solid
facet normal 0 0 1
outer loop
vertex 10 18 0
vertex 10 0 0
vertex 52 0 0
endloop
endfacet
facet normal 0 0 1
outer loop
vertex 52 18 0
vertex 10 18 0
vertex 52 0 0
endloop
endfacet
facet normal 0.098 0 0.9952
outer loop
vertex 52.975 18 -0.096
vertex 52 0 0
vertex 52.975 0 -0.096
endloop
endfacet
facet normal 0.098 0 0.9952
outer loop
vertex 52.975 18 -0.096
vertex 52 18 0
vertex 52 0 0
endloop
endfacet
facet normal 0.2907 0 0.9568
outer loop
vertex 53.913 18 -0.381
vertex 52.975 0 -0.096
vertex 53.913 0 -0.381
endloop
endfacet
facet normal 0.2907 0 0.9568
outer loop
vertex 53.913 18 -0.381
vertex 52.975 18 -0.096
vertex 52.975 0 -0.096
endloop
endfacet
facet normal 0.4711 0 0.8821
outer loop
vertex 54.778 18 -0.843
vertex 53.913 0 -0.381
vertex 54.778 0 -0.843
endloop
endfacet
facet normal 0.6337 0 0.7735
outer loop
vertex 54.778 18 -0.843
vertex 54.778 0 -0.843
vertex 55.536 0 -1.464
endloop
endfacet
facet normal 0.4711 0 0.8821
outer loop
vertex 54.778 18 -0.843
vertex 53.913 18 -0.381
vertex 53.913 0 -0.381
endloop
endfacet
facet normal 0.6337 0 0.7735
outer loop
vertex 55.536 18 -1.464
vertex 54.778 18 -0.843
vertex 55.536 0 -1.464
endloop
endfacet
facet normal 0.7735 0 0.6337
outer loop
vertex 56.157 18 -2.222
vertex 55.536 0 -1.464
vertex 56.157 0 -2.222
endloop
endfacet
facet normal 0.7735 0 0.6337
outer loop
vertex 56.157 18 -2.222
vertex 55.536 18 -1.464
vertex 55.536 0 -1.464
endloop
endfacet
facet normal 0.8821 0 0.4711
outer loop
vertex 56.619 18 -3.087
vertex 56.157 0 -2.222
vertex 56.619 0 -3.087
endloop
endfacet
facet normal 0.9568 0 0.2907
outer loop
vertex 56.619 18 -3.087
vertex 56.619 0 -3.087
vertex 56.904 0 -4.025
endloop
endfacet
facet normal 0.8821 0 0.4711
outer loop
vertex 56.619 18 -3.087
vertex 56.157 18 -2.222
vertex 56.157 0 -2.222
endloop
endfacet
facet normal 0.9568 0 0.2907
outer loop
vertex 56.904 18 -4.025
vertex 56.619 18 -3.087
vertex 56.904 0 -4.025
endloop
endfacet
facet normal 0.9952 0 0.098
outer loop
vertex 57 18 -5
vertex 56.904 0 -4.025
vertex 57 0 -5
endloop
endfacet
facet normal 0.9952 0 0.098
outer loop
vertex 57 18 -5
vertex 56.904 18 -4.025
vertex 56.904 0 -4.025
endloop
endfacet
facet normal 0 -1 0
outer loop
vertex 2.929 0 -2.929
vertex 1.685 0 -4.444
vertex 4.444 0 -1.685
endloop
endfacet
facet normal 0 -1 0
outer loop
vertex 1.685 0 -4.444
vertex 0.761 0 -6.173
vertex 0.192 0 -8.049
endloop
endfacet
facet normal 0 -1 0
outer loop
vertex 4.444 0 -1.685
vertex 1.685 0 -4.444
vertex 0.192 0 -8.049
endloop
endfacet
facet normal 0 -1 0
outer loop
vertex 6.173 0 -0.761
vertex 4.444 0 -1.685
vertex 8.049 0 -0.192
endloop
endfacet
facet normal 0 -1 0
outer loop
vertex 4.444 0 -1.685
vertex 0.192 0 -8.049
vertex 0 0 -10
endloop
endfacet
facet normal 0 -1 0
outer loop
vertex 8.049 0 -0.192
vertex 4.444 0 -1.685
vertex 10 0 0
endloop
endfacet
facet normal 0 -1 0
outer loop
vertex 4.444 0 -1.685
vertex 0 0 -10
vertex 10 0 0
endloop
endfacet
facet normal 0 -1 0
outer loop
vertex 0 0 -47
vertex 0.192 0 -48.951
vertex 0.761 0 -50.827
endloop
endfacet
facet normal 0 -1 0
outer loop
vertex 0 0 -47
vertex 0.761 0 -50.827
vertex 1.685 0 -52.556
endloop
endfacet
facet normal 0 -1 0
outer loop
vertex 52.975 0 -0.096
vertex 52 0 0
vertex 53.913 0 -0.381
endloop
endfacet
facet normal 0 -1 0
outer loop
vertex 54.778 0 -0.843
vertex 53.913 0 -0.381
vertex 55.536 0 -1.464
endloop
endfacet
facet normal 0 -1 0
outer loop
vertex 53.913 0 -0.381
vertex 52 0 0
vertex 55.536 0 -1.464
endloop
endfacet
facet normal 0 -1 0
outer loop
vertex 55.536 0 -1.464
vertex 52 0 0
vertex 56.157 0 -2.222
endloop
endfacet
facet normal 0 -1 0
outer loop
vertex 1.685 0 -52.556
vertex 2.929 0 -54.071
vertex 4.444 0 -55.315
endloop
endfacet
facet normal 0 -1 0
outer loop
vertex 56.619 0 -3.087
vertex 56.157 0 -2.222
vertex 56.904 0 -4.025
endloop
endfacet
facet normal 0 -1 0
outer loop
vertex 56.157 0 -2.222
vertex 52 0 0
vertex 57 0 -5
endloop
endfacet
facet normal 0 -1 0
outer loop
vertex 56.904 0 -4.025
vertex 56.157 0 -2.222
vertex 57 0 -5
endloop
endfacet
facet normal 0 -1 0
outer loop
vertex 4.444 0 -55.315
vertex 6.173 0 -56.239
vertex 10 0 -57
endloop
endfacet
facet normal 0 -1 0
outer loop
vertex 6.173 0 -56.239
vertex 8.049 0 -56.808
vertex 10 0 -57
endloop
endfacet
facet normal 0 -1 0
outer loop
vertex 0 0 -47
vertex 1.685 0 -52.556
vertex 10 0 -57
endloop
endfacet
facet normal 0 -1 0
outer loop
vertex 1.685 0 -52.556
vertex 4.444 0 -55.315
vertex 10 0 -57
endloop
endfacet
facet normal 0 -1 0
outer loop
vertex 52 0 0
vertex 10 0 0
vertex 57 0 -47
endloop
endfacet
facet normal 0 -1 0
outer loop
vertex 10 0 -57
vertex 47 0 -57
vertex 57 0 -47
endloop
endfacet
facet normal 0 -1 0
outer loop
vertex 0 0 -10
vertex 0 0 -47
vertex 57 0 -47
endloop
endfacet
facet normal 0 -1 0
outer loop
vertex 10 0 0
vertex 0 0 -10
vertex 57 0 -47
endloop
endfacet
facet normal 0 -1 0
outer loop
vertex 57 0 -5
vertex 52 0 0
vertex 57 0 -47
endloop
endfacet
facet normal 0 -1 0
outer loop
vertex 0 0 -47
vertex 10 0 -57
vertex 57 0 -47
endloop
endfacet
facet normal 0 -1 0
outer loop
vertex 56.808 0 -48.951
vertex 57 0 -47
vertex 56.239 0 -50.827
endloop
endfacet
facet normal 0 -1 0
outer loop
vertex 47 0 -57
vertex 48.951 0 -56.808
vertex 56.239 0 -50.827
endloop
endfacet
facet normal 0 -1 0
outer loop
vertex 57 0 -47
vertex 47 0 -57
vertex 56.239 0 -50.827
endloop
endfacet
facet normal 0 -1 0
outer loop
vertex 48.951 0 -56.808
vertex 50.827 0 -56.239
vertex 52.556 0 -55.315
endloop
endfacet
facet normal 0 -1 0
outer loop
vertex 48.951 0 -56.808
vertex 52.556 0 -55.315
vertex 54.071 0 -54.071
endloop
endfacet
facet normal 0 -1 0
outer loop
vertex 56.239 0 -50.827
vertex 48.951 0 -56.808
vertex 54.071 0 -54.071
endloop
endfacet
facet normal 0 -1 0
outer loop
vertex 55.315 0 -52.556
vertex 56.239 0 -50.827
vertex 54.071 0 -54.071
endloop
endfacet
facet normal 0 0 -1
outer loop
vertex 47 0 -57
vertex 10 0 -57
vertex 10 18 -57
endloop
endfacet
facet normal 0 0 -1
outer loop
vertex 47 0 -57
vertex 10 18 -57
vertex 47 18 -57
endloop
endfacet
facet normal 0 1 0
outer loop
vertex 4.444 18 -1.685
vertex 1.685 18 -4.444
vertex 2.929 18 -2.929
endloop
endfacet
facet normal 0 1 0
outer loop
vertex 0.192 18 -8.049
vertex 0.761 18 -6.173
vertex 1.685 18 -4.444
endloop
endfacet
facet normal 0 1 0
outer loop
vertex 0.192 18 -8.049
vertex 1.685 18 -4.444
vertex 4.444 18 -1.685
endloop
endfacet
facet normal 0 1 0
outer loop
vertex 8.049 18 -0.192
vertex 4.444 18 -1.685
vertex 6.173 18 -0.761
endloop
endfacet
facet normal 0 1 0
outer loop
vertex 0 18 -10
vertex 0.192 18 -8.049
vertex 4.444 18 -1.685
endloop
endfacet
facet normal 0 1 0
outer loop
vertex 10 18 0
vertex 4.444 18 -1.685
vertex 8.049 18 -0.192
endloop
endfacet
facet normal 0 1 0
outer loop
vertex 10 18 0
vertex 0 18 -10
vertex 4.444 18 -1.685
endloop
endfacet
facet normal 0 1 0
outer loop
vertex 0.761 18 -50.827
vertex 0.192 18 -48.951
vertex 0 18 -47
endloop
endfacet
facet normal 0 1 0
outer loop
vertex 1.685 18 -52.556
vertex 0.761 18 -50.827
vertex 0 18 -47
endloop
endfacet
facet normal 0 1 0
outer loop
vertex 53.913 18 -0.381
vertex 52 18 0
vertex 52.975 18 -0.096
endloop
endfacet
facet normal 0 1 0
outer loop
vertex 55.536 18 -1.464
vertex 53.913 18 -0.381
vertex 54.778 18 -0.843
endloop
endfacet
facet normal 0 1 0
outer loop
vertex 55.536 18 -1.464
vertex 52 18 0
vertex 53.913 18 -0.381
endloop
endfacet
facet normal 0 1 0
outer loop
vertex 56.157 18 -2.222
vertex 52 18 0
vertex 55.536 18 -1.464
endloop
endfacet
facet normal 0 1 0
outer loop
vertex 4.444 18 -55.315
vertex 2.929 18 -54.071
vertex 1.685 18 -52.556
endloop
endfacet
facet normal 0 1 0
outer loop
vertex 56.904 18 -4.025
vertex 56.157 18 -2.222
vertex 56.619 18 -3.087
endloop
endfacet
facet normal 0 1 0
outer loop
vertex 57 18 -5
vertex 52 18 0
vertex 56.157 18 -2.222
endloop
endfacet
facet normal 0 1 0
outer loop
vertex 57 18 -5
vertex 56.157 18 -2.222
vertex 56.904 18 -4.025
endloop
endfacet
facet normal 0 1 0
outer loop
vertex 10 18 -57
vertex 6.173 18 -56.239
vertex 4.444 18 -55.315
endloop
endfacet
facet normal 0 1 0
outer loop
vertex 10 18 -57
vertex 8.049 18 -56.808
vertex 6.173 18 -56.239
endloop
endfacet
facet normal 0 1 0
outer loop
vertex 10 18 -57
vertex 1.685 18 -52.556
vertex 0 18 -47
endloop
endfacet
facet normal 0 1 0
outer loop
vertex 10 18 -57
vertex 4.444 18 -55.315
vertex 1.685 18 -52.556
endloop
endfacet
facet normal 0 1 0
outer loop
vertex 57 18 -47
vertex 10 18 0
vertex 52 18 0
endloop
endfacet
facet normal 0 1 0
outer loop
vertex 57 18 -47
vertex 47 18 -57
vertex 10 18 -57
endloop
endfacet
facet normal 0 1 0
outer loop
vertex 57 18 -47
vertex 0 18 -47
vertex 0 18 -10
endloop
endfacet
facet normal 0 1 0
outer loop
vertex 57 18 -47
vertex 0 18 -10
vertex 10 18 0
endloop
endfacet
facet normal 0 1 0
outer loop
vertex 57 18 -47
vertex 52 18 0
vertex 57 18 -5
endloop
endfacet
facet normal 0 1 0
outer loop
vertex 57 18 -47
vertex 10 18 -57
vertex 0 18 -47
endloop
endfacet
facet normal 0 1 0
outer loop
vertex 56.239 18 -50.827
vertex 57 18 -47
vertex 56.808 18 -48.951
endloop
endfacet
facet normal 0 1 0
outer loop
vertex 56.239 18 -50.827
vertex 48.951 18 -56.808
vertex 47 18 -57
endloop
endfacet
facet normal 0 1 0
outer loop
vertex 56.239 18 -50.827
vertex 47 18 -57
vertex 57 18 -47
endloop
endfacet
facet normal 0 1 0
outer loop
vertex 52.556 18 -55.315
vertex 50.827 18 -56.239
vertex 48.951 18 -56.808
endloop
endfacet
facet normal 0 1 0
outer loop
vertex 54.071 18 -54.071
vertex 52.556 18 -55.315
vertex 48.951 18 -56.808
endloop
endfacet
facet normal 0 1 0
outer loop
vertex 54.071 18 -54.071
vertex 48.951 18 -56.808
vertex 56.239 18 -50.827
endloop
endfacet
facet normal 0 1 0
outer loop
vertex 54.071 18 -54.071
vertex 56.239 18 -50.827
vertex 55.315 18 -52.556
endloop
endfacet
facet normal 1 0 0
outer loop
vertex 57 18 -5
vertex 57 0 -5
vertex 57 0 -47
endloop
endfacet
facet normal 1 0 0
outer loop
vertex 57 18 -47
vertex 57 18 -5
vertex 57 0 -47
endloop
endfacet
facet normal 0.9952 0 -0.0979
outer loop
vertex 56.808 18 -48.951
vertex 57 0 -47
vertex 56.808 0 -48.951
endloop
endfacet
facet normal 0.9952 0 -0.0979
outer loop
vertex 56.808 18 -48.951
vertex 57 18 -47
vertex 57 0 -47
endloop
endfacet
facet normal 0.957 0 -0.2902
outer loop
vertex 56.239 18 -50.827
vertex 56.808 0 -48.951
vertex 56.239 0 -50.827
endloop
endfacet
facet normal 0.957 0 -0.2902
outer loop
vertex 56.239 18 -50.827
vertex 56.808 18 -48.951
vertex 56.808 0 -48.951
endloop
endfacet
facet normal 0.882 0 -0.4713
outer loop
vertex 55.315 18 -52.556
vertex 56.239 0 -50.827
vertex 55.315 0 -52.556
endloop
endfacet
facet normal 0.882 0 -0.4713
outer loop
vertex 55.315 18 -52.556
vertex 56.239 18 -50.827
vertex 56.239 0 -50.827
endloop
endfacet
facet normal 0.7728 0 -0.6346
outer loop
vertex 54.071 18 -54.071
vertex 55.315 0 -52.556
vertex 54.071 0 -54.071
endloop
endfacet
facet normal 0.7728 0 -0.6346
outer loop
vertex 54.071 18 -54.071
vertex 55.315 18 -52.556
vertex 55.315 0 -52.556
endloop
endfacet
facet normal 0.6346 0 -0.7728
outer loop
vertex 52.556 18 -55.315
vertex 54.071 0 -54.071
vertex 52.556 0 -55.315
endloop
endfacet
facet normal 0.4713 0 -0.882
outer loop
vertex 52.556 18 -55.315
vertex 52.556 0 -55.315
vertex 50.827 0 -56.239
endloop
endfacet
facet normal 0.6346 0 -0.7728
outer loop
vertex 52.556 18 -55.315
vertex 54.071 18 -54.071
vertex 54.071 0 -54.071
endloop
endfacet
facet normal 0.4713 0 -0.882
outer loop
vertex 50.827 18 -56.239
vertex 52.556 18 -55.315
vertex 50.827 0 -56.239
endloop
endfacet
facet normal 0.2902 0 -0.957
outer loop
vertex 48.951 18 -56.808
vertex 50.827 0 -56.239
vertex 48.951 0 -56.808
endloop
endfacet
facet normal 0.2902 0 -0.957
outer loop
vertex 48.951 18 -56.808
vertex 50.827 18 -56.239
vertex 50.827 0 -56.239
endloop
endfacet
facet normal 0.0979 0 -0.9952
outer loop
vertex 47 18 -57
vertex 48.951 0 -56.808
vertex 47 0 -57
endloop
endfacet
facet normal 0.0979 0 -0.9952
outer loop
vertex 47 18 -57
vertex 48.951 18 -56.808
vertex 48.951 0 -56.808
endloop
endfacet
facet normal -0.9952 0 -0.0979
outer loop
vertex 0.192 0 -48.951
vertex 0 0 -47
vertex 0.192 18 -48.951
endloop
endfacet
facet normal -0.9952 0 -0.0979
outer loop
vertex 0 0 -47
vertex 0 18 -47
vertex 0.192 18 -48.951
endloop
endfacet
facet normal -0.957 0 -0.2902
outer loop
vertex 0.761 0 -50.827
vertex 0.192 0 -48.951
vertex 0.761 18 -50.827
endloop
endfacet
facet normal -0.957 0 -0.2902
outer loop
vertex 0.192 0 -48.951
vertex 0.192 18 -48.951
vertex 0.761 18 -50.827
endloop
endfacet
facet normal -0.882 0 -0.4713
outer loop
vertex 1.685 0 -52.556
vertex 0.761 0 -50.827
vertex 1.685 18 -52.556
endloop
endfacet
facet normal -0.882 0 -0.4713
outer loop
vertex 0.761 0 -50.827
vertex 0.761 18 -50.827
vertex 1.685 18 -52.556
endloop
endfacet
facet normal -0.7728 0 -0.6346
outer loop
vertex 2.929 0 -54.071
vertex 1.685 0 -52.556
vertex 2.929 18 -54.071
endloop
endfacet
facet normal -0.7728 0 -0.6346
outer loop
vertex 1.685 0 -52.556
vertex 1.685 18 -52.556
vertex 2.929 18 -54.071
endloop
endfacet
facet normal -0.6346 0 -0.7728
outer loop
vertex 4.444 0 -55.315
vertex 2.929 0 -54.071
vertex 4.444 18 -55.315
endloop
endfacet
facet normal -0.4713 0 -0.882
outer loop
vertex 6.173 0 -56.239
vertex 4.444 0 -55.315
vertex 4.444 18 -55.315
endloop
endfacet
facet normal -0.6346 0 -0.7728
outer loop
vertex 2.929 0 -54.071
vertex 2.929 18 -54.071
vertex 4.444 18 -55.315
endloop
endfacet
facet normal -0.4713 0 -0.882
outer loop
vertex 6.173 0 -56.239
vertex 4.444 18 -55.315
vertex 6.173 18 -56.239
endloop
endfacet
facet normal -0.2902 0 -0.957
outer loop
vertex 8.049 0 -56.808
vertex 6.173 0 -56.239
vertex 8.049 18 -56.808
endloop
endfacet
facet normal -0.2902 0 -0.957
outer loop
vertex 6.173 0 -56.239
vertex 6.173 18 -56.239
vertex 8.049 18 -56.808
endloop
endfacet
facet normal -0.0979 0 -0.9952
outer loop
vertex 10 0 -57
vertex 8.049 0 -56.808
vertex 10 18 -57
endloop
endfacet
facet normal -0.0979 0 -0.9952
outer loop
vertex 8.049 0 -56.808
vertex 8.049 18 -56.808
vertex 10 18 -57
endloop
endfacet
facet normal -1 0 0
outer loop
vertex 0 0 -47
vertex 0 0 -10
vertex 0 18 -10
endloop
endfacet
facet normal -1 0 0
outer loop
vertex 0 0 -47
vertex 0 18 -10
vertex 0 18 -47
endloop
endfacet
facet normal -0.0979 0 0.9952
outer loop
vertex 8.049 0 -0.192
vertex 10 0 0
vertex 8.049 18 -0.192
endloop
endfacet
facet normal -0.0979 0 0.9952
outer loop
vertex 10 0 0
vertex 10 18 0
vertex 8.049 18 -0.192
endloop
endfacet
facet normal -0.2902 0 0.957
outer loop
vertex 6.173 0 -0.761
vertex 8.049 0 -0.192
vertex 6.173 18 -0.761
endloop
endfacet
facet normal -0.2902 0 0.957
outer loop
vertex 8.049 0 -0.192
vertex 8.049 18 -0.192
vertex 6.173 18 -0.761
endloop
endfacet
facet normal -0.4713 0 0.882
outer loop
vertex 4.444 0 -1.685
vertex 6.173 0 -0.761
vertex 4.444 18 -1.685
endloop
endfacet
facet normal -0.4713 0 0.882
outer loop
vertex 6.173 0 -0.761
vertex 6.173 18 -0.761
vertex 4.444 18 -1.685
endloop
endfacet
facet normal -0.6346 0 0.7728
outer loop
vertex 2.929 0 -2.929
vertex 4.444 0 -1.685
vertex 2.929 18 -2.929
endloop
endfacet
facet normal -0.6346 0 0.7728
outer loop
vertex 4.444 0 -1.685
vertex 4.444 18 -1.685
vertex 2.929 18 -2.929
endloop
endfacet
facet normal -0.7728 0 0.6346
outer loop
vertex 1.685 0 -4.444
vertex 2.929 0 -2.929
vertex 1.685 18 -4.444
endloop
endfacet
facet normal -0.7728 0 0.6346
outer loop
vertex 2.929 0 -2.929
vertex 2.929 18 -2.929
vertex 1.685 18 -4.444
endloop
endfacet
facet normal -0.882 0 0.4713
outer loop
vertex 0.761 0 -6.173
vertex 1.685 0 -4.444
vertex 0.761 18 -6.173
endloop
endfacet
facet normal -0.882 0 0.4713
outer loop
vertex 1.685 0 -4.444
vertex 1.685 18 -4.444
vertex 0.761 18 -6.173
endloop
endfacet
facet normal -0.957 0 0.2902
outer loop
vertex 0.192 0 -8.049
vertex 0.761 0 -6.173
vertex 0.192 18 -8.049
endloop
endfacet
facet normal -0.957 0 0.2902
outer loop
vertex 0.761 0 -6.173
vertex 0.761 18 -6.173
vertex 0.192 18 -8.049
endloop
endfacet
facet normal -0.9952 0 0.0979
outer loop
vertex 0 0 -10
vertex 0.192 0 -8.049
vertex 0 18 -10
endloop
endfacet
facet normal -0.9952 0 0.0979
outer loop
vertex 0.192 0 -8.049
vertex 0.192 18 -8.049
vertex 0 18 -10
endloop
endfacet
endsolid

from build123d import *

# Parameters (mm, degrees)
SKETCH1_W           = 57
SKETCH1_H           = 57
BOSS_EXTRUDE1_DEPTH = 18
FILLET1_R           = 5
FILLET2_R           = 10


with BuildPart() as part:
    # Sketch1 → Boss-Extrude1 (new body)
    with BuildSketch(Plane(origin=(0, 0, 0), x_dir=(1, 0, 0), z_dir=(0, 1, 0))):
        with Locations((28.5, 28.5)):
            Rectangle(SKETCH1_W, SKETCH1_H)
    extrude(amount=BOSS_EXTRUDE1_DEPTH)

    # Fillet1
    fillet1_edges = [part.edges().sort_by_distance(p)[0] for p in [
        (57, 9, 0),
    ]]
    fillet(fillet1_edges, radius=FILLET1_R)

    # Fillet2
    fillet2_edges = [part.edges().sort_by_distance(p)[0] for p in [
        (0, 9, -57),
        (57, 9, -57),
        (0, 9, 0),
    ]]
    fillet(fillet2_edges, radius=FILLET2_R)


solid = part.part
